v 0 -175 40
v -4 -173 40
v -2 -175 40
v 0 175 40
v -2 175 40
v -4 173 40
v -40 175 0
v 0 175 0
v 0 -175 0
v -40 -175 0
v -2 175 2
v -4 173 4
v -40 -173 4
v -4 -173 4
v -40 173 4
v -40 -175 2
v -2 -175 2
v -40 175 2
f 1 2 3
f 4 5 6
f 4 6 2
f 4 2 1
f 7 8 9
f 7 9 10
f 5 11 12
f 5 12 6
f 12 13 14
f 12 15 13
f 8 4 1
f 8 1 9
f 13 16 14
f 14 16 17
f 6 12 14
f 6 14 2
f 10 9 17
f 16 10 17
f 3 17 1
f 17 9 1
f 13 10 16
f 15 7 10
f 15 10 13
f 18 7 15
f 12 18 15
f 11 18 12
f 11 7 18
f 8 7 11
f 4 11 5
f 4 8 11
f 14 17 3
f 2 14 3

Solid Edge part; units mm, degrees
sketch "Sketch1" plane through (-9.04, 0, 33.0648) normal (0, -1, 0) x (1, 0, 0)
  line L0 (-30.96, -29.0648) -> (5.04, -29.0648)
  line L1 (5.04, -29.0648) -> (5.04, 6.9352)
  line L2 (5.04, 6.9352) -> (9.04, 6.9352)
  line L3 (9.04, 6.9352) -> (9.04, -33.0648)
  line L4 (9.04, -33.0648) -> (-30.96, -33.0648)
  line L5 (-30.96, -33.0648) -> (-30.96, -29.0648)
extrude "Protrusion1" add sketch "Sketch1" along normal mid plane 350
chamfer "Fase_2" distance 2 angle 45 4 edges at (-22, 175, 4) (-4, 175, 22) (-22, -175, 4) (-4, -175, 22)
